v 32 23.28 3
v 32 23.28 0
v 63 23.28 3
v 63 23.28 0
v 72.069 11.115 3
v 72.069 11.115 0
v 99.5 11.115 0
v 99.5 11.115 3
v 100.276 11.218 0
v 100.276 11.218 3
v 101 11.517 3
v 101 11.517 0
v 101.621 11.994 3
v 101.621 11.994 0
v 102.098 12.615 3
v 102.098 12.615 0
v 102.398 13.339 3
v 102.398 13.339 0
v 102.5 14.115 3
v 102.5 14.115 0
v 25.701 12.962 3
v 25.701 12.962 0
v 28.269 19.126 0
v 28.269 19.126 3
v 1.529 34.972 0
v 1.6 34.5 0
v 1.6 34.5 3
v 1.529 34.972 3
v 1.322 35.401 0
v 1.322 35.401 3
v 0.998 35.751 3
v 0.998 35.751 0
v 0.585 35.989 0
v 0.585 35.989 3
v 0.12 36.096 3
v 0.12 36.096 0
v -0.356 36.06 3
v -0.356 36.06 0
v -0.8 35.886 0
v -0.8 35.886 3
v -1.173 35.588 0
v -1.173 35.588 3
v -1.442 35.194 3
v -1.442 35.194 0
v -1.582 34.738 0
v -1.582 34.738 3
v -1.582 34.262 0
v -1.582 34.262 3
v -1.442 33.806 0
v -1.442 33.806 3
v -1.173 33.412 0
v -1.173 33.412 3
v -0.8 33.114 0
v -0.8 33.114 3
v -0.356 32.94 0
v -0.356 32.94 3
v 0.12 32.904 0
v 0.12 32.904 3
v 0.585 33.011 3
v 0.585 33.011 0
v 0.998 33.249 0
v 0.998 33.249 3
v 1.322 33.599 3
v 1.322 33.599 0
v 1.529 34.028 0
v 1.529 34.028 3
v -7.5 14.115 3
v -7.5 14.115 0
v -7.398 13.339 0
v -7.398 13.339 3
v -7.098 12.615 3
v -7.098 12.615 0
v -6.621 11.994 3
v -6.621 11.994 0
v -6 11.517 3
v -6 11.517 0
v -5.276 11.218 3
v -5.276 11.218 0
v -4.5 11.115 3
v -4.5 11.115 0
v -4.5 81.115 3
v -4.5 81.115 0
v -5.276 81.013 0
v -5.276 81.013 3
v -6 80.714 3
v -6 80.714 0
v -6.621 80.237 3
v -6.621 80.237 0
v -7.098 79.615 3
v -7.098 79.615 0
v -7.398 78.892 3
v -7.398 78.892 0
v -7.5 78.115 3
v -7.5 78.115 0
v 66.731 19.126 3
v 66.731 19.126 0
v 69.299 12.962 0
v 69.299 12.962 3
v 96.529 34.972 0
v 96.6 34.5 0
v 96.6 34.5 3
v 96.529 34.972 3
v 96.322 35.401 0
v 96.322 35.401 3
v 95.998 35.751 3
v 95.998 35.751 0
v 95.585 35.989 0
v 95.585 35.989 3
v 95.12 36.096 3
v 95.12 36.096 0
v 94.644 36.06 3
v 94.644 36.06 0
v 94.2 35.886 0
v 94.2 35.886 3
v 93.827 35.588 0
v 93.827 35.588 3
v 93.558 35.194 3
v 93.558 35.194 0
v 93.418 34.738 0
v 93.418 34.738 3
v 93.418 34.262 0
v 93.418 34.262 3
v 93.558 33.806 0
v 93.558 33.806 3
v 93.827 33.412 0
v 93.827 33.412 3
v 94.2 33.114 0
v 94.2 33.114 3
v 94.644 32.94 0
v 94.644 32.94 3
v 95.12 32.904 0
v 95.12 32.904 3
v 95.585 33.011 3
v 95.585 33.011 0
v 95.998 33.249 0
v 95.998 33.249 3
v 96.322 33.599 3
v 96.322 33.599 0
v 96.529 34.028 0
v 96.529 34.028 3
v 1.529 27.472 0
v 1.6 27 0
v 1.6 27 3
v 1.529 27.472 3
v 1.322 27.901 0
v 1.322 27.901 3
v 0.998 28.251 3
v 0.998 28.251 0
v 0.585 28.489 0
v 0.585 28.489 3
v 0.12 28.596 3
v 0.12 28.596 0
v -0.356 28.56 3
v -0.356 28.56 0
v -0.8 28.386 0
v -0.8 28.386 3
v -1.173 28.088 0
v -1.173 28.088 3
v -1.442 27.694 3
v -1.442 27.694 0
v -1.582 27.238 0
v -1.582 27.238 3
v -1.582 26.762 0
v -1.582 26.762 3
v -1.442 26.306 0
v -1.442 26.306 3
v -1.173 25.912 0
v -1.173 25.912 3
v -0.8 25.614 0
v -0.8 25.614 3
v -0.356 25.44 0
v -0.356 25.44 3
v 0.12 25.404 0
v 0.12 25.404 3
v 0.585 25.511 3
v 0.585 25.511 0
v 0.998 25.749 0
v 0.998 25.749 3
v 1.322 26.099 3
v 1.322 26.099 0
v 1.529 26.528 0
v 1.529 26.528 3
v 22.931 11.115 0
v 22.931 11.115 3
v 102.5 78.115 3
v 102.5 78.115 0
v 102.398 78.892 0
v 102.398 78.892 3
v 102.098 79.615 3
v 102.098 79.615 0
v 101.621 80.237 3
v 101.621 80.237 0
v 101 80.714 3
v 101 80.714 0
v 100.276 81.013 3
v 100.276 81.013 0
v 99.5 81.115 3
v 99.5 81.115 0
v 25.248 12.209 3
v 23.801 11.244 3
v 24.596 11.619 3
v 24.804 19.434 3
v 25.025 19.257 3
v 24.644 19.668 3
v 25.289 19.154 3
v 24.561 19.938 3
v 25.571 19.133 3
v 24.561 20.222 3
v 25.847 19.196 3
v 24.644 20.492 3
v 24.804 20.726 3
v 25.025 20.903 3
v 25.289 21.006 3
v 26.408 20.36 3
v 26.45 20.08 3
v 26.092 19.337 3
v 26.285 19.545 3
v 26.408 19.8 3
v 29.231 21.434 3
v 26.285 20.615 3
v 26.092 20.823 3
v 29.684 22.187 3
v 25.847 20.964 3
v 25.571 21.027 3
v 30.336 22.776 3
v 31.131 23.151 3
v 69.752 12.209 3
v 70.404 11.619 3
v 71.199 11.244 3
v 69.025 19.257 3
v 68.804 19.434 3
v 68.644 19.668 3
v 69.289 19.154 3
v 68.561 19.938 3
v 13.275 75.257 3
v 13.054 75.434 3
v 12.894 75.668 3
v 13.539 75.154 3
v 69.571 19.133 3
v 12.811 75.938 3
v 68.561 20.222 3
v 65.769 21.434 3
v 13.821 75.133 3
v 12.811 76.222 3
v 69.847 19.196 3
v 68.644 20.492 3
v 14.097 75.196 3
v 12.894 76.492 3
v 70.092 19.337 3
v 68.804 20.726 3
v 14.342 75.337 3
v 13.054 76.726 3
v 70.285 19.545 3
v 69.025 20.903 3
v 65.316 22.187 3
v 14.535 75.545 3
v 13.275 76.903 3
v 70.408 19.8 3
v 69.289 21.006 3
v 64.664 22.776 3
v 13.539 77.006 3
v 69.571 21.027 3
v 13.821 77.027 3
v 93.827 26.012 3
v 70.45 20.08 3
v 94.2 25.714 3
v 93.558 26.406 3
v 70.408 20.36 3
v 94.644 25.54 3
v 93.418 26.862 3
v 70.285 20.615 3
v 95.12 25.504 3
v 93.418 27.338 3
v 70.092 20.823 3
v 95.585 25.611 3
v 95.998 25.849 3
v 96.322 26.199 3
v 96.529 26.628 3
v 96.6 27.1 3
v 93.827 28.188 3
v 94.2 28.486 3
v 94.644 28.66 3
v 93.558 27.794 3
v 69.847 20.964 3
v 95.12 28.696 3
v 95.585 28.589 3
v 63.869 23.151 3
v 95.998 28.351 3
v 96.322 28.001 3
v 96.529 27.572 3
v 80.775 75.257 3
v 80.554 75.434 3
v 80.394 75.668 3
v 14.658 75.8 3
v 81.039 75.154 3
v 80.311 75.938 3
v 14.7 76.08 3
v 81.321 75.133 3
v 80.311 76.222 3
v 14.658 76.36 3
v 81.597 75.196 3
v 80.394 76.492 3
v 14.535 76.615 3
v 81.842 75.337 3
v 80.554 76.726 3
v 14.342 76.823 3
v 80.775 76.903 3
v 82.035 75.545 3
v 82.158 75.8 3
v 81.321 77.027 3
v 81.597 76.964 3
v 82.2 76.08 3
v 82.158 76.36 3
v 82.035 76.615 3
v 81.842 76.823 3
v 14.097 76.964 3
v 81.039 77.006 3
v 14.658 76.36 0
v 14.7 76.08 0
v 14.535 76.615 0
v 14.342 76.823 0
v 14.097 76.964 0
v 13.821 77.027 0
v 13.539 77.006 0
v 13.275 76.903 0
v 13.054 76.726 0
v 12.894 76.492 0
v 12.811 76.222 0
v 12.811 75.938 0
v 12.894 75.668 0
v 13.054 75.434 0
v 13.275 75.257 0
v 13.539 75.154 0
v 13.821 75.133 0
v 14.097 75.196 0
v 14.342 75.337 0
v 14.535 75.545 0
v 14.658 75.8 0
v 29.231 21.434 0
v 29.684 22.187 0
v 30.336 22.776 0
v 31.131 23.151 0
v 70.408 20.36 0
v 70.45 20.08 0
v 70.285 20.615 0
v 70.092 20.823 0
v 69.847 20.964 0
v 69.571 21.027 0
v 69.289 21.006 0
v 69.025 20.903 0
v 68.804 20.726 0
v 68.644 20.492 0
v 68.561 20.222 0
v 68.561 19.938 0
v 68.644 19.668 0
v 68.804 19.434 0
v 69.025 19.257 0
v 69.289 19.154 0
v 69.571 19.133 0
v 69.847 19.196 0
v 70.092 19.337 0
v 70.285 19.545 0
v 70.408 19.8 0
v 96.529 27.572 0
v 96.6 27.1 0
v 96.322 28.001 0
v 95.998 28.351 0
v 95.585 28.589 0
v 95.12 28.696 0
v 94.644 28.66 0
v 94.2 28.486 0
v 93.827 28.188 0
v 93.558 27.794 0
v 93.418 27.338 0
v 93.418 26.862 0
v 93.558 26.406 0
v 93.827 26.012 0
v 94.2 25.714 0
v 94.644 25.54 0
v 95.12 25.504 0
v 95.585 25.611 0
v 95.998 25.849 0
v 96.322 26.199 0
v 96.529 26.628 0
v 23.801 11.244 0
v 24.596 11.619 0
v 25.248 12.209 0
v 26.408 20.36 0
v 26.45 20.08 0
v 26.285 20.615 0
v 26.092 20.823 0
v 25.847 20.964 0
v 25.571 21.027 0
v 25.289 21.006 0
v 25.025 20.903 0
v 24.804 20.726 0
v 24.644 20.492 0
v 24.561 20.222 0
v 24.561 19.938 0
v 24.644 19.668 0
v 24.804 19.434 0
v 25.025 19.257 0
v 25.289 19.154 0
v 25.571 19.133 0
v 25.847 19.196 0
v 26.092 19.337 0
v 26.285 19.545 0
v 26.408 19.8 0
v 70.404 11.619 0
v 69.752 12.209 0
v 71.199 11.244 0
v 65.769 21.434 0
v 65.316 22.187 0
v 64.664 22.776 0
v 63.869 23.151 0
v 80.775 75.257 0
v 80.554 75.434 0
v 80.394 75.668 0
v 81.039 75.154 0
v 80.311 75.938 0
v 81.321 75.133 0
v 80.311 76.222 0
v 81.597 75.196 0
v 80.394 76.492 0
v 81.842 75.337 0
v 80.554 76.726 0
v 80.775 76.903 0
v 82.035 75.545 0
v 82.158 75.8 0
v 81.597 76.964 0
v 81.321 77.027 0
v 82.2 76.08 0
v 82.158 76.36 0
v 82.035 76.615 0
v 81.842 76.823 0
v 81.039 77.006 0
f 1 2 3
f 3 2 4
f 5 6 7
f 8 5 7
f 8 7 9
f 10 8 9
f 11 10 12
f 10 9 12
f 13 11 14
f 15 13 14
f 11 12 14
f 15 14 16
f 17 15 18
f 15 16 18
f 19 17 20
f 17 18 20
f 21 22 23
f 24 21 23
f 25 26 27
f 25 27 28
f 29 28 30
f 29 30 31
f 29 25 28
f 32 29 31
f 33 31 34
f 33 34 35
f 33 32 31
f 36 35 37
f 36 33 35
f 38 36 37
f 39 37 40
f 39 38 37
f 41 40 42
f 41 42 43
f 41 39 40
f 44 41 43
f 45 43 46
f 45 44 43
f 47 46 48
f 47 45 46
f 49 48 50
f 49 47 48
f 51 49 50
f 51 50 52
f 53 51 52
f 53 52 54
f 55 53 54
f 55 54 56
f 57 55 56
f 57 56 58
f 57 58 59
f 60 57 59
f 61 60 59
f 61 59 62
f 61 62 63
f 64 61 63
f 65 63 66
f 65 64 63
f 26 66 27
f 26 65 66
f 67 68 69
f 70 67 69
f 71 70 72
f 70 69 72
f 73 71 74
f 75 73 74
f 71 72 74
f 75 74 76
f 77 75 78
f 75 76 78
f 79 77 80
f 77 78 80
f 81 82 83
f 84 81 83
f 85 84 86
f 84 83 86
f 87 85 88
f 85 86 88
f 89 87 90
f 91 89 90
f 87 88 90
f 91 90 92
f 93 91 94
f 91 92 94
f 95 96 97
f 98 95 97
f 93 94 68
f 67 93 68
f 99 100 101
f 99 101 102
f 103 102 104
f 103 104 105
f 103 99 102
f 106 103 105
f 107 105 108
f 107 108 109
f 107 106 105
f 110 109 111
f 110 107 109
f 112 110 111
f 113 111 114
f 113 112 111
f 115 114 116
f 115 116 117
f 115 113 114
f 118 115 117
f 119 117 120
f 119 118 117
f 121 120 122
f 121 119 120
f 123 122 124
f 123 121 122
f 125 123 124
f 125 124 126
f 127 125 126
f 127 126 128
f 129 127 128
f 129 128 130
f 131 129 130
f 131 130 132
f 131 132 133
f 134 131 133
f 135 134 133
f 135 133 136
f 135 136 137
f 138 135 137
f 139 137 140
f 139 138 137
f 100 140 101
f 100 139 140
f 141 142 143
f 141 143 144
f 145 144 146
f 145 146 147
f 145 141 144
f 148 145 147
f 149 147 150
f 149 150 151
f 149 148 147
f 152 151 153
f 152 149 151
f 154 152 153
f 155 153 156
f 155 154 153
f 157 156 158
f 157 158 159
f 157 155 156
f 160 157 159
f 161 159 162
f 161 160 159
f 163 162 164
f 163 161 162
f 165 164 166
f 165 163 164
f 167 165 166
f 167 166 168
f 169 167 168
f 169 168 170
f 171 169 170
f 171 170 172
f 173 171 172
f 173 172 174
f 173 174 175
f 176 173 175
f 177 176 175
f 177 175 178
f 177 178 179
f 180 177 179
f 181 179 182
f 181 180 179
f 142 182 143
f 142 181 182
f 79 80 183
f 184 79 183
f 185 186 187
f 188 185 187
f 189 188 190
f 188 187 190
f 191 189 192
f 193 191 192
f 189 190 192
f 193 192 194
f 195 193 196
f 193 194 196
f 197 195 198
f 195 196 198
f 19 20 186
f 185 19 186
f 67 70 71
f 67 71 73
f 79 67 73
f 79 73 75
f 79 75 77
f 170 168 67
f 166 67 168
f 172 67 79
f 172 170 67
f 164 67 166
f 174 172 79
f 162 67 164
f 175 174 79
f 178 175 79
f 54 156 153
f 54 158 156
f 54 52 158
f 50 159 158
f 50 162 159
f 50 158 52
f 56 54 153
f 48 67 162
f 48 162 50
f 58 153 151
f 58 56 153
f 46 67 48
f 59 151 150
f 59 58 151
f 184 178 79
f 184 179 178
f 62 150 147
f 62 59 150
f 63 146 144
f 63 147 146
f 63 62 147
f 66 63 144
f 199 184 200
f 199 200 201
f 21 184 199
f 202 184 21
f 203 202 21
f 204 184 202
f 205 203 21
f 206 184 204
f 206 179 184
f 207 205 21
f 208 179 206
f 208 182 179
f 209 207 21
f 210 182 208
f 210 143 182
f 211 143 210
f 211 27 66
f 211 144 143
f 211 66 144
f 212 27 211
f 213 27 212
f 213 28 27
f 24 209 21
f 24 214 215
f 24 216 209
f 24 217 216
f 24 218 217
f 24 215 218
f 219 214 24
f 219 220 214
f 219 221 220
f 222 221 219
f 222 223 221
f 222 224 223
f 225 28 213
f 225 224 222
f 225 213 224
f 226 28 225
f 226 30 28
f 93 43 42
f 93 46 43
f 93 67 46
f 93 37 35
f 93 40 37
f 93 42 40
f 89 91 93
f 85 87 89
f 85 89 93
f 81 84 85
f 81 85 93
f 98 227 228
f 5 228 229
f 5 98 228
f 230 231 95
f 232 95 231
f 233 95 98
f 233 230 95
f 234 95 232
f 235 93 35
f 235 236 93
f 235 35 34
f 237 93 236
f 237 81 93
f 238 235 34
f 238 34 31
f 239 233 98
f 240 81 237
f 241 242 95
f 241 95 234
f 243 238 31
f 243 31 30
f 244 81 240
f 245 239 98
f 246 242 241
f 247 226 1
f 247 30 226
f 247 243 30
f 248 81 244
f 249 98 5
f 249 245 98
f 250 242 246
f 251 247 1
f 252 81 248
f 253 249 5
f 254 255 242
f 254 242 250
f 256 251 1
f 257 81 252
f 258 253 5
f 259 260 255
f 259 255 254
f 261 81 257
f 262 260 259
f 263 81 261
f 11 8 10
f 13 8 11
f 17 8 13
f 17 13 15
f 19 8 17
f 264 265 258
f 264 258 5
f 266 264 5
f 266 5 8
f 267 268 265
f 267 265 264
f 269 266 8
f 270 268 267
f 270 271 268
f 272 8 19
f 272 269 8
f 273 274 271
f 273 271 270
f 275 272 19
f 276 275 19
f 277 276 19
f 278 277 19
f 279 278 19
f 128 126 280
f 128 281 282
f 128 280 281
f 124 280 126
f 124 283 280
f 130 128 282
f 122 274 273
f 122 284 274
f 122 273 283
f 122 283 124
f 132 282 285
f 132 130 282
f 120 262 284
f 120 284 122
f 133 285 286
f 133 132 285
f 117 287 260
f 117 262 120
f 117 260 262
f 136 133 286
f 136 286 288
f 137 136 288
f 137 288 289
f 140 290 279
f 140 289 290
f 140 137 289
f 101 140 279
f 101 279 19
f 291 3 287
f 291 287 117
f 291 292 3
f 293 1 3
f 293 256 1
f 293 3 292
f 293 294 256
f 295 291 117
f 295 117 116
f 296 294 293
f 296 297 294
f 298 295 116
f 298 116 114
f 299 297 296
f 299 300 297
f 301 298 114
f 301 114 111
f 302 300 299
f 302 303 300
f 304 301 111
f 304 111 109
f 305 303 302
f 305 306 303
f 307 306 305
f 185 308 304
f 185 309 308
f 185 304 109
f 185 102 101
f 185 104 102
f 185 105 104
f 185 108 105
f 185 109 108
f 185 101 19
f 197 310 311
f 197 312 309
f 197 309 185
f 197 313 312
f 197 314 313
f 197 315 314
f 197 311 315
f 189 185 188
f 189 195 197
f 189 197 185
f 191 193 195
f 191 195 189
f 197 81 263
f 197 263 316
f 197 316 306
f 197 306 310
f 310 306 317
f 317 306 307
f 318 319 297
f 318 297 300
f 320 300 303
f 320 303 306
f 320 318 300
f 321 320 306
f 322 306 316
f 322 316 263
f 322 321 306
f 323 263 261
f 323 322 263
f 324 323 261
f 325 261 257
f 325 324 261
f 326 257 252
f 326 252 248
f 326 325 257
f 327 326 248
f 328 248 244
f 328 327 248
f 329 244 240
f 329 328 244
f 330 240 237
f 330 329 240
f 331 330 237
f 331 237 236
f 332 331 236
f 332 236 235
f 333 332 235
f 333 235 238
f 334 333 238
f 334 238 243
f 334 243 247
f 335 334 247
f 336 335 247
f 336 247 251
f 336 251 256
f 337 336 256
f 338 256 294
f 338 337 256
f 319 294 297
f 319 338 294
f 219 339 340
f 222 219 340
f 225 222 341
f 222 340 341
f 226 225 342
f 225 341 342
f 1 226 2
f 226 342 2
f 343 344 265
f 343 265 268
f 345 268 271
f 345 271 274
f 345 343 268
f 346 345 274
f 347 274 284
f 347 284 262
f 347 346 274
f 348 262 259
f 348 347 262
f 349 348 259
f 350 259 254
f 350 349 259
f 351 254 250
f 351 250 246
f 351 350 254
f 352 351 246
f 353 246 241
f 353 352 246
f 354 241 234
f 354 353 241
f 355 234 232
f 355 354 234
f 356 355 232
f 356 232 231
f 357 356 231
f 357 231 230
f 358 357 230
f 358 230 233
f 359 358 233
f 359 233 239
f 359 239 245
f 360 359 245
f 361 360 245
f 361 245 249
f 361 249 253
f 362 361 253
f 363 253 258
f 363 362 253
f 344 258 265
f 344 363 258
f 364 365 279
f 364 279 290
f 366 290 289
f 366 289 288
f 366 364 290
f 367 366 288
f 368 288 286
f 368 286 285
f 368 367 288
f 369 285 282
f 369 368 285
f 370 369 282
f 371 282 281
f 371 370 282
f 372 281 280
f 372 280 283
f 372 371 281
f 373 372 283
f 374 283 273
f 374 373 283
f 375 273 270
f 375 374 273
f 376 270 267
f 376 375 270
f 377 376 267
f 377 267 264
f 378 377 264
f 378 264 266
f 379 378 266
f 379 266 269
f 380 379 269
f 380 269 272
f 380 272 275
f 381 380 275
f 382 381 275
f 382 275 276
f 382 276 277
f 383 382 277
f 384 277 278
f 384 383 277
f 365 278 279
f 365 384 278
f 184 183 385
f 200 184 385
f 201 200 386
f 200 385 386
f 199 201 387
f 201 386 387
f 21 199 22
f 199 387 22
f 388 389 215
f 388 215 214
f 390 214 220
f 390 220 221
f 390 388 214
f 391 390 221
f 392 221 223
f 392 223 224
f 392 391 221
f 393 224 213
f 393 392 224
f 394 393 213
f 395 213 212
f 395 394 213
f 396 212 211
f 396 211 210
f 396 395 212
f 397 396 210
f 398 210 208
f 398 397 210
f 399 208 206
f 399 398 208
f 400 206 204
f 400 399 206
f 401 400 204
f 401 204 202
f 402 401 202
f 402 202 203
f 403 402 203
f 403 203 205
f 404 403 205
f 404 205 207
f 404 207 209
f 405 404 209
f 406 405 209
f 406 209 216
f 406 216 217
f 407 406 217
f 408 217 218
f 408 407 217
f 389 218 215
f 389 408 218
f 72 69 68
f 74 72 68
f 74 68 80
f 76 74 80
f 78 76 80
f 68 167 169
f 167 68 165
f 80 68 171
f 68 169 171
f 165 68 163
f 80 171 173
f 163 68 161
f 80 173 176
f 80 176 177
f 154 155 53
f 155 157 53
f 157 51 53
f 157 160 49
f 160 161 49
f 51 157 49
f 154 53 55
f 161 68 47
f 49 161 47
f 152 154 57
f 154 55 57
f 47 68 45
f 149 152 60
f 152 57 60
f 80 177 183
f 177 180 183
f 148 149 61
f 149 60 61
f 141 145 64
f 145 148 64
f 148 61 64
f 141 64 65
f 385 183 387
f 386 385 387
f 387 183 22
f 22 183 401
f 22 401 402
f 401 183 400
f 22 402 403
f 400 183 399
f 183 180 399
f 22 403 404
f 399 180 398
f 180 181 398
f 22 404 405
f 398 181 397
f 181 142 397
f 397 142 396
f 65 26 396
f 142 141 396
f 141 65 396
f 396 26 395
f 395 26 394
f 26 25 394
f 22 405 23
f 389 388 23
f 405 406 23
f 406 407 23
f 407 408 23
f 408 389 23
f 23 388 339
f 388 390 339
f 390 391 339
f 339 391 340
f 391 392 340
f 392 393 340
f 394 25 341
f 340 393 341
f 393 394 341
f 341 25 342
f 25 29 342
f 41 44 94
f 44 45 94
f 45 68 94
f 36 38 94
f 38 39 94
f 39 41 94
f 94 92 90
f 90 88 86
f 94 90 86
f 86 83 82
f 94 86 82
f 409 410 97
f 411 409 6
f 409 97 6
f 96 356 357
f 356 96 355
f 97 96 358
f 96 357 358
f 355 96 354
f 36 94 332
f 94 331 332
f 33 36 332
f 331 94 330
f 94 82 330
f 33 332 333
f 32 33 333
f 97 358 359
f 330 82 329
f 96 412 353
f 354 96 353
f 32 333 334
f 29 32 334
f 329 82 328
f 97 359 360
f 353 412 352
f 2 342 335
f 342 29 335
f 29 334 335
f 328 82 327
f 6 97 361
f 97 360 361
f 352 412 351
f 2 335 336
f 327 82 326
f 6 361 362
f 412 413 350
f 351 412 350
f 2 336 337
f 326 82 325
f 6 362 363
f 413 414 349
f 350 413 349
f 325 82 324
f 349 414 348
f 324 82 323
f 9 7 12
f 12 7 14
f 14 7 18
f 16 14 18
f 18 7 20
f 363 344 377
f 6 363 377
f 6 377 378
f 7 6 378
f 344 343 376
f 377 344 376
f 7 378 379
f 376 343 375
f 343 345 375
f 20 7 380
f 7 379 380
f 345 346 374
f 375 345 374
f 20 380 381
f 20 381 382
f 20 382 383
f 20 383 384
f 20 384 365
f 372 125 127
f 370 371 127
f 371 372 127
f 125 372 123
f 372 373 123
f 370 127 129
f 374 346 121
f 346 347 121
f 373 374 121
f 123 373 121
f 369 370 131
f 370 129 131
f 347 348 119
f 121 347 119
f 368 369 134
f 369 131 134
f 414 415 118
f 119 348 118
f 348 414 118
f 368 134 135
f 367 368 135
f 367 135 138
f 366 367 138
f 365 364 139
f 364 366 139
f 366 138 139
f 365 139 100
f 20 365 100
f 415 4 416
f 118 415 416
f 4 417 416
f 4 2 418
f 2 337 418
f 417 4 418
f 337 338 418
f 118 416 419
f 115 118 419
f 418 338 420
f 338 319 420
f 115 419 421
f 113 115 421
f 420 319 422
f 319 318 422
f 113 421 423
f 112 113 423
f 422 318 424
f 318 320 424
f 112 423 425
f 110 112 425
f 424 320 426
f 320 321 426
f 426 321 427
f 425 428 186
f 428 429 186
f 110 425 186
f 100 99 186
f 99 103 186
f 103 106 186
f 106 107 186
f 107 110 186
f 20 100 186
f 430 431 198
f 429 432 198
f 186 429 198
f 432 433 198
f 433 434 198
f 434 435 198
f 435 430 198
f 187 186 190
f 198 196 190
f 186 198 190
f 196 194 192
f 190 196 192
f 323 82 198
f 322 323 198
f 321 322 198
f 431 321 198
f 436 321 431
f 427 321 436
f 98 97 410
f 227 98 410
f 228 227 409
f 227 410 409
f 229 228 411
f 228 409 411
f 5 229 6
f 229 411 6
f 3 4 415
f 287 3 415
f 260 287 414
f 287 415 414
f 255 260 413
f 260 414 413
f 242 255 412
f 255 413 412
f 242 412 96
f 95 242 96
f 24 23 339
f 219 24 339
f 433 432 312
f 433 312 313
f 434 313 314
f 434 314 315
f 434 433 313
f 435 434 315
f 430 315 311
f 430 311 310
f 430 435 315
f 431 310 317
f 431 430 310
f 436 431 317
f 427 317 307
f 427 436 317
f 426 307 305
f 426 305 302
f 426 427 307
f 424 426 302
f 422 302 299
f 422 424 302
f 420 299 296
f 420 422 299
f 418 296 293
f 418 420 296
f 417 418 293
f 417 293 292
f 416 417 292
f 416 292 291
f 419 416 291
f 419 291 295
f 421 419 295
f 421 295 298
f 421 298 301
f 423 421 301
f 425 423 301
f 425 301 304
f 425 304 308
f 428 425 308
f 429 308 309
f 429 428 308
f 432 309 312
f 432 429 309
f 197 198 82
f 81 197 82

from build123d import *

# Parameters (mm, degrees)
SKETCH_1_R      = 1.6
SKETCH_1_R_2    = 0.95
EXTRUDE_1_DEPTH = 3


with BuildPart() as part:
    # 草图1 → 凸台-拉伸1 (new body)
    with BuildSketch(Plane.XY):
        with BuildLine():
            Line((32, 23.279914581), (63, 23.279914581))
            ThreePointArc((63, 23.279914581), (64.664100589, 22.776065464), (65.769230769, 21.433760735))
            Line((65.769230769, 21.433760735), (66.730769231, 19.126068427))
            Line((66.730769231, 19.126068427), (69.29930559, 12.961581165))
            ThreePointArc((69.29930559, 12.961581165), (70.404435771, 11.619276436), (72.068536359, 11.115427319))
            Line((72.068536359, 11.115427319), (99.5, 11.115427319))
            ThreePointArc((99.5, 11.115427319), (101.621320344, 11.994106975), (102.5, 14.115427319))
            Line((102.5, 14.115427319), (102.5, 78.115427319))
            ThreePointArc((102.5, 78.115427319), (101.621320344, 80.236747662), (99.5, 81.115427319))
            Line((99.5, 81.115427319), (-4.5, 81.115427319))
            ThreePointArc((-4.5, 81.115427319), (-6.621320344, 80.236747662), (-7.5, 78.115427319))
            Line((-7.5, 78.115427319), (-7.5, 14.115427319))
            ThreePointArc((-7.5, 14.115427319), (-6.621320344, 11.994106975), (-4.5, 11.115427319))
            Line((-4.5, 11.115427319), (22.931463641, 11.115427319))
            ThreePointArc((22.931463641, 11.115427319), (24.595564229, 11.619276436), (25.70069441, 12.961581165))
            Line((25.70069441, 12.961581165), (28.269230769, 19.126068427))
            Line((28.269230769, 19.126068427), (29.230769231, 21.433760735))
            ThreePointArc((29.230769231, 21.433760735), (30.335899411, 22.776065464), (32, 23.279914581))
        make_face()
        with Locations((0, 34.5)):
            Circle(SKETCH_1_R, mode=Mode.SUBTRACT)
        with Locations((0, 27)):
            Circle(SKETCH_1_R, mode=Mode.SUBTRACT)
        with Locations((95, 34.5)):
            Circle(SKETCH_1_R, mode=Mode.SUBTRACT)
        with Locations((95, 27.1)):
            Circle(SKETCH_1_R, mode=Mode.SUBTRACT)
        with Locations((13.75, 76.079914581)):
            Circle(SKETCH_1_R_2, mode=Mode.SUBTRACT)
        with Locations((81.25, 76.079914581)):
            Circle(SKETCH_1_R_2, mode=Mode.SUBTRACT)
        with Locations((69.5, 20.079914581)):
            Circle(SKETCH_1_R_2, mode=Mode.SUBTRACT)
        with Locations((25.5, 20.079914581)):
            Circle(SKETCH_1_R_2, mode=Mode.SUBTRACT)
    extrude(amount=EXTRUDE_1_DEPTH)


solid = part.part
